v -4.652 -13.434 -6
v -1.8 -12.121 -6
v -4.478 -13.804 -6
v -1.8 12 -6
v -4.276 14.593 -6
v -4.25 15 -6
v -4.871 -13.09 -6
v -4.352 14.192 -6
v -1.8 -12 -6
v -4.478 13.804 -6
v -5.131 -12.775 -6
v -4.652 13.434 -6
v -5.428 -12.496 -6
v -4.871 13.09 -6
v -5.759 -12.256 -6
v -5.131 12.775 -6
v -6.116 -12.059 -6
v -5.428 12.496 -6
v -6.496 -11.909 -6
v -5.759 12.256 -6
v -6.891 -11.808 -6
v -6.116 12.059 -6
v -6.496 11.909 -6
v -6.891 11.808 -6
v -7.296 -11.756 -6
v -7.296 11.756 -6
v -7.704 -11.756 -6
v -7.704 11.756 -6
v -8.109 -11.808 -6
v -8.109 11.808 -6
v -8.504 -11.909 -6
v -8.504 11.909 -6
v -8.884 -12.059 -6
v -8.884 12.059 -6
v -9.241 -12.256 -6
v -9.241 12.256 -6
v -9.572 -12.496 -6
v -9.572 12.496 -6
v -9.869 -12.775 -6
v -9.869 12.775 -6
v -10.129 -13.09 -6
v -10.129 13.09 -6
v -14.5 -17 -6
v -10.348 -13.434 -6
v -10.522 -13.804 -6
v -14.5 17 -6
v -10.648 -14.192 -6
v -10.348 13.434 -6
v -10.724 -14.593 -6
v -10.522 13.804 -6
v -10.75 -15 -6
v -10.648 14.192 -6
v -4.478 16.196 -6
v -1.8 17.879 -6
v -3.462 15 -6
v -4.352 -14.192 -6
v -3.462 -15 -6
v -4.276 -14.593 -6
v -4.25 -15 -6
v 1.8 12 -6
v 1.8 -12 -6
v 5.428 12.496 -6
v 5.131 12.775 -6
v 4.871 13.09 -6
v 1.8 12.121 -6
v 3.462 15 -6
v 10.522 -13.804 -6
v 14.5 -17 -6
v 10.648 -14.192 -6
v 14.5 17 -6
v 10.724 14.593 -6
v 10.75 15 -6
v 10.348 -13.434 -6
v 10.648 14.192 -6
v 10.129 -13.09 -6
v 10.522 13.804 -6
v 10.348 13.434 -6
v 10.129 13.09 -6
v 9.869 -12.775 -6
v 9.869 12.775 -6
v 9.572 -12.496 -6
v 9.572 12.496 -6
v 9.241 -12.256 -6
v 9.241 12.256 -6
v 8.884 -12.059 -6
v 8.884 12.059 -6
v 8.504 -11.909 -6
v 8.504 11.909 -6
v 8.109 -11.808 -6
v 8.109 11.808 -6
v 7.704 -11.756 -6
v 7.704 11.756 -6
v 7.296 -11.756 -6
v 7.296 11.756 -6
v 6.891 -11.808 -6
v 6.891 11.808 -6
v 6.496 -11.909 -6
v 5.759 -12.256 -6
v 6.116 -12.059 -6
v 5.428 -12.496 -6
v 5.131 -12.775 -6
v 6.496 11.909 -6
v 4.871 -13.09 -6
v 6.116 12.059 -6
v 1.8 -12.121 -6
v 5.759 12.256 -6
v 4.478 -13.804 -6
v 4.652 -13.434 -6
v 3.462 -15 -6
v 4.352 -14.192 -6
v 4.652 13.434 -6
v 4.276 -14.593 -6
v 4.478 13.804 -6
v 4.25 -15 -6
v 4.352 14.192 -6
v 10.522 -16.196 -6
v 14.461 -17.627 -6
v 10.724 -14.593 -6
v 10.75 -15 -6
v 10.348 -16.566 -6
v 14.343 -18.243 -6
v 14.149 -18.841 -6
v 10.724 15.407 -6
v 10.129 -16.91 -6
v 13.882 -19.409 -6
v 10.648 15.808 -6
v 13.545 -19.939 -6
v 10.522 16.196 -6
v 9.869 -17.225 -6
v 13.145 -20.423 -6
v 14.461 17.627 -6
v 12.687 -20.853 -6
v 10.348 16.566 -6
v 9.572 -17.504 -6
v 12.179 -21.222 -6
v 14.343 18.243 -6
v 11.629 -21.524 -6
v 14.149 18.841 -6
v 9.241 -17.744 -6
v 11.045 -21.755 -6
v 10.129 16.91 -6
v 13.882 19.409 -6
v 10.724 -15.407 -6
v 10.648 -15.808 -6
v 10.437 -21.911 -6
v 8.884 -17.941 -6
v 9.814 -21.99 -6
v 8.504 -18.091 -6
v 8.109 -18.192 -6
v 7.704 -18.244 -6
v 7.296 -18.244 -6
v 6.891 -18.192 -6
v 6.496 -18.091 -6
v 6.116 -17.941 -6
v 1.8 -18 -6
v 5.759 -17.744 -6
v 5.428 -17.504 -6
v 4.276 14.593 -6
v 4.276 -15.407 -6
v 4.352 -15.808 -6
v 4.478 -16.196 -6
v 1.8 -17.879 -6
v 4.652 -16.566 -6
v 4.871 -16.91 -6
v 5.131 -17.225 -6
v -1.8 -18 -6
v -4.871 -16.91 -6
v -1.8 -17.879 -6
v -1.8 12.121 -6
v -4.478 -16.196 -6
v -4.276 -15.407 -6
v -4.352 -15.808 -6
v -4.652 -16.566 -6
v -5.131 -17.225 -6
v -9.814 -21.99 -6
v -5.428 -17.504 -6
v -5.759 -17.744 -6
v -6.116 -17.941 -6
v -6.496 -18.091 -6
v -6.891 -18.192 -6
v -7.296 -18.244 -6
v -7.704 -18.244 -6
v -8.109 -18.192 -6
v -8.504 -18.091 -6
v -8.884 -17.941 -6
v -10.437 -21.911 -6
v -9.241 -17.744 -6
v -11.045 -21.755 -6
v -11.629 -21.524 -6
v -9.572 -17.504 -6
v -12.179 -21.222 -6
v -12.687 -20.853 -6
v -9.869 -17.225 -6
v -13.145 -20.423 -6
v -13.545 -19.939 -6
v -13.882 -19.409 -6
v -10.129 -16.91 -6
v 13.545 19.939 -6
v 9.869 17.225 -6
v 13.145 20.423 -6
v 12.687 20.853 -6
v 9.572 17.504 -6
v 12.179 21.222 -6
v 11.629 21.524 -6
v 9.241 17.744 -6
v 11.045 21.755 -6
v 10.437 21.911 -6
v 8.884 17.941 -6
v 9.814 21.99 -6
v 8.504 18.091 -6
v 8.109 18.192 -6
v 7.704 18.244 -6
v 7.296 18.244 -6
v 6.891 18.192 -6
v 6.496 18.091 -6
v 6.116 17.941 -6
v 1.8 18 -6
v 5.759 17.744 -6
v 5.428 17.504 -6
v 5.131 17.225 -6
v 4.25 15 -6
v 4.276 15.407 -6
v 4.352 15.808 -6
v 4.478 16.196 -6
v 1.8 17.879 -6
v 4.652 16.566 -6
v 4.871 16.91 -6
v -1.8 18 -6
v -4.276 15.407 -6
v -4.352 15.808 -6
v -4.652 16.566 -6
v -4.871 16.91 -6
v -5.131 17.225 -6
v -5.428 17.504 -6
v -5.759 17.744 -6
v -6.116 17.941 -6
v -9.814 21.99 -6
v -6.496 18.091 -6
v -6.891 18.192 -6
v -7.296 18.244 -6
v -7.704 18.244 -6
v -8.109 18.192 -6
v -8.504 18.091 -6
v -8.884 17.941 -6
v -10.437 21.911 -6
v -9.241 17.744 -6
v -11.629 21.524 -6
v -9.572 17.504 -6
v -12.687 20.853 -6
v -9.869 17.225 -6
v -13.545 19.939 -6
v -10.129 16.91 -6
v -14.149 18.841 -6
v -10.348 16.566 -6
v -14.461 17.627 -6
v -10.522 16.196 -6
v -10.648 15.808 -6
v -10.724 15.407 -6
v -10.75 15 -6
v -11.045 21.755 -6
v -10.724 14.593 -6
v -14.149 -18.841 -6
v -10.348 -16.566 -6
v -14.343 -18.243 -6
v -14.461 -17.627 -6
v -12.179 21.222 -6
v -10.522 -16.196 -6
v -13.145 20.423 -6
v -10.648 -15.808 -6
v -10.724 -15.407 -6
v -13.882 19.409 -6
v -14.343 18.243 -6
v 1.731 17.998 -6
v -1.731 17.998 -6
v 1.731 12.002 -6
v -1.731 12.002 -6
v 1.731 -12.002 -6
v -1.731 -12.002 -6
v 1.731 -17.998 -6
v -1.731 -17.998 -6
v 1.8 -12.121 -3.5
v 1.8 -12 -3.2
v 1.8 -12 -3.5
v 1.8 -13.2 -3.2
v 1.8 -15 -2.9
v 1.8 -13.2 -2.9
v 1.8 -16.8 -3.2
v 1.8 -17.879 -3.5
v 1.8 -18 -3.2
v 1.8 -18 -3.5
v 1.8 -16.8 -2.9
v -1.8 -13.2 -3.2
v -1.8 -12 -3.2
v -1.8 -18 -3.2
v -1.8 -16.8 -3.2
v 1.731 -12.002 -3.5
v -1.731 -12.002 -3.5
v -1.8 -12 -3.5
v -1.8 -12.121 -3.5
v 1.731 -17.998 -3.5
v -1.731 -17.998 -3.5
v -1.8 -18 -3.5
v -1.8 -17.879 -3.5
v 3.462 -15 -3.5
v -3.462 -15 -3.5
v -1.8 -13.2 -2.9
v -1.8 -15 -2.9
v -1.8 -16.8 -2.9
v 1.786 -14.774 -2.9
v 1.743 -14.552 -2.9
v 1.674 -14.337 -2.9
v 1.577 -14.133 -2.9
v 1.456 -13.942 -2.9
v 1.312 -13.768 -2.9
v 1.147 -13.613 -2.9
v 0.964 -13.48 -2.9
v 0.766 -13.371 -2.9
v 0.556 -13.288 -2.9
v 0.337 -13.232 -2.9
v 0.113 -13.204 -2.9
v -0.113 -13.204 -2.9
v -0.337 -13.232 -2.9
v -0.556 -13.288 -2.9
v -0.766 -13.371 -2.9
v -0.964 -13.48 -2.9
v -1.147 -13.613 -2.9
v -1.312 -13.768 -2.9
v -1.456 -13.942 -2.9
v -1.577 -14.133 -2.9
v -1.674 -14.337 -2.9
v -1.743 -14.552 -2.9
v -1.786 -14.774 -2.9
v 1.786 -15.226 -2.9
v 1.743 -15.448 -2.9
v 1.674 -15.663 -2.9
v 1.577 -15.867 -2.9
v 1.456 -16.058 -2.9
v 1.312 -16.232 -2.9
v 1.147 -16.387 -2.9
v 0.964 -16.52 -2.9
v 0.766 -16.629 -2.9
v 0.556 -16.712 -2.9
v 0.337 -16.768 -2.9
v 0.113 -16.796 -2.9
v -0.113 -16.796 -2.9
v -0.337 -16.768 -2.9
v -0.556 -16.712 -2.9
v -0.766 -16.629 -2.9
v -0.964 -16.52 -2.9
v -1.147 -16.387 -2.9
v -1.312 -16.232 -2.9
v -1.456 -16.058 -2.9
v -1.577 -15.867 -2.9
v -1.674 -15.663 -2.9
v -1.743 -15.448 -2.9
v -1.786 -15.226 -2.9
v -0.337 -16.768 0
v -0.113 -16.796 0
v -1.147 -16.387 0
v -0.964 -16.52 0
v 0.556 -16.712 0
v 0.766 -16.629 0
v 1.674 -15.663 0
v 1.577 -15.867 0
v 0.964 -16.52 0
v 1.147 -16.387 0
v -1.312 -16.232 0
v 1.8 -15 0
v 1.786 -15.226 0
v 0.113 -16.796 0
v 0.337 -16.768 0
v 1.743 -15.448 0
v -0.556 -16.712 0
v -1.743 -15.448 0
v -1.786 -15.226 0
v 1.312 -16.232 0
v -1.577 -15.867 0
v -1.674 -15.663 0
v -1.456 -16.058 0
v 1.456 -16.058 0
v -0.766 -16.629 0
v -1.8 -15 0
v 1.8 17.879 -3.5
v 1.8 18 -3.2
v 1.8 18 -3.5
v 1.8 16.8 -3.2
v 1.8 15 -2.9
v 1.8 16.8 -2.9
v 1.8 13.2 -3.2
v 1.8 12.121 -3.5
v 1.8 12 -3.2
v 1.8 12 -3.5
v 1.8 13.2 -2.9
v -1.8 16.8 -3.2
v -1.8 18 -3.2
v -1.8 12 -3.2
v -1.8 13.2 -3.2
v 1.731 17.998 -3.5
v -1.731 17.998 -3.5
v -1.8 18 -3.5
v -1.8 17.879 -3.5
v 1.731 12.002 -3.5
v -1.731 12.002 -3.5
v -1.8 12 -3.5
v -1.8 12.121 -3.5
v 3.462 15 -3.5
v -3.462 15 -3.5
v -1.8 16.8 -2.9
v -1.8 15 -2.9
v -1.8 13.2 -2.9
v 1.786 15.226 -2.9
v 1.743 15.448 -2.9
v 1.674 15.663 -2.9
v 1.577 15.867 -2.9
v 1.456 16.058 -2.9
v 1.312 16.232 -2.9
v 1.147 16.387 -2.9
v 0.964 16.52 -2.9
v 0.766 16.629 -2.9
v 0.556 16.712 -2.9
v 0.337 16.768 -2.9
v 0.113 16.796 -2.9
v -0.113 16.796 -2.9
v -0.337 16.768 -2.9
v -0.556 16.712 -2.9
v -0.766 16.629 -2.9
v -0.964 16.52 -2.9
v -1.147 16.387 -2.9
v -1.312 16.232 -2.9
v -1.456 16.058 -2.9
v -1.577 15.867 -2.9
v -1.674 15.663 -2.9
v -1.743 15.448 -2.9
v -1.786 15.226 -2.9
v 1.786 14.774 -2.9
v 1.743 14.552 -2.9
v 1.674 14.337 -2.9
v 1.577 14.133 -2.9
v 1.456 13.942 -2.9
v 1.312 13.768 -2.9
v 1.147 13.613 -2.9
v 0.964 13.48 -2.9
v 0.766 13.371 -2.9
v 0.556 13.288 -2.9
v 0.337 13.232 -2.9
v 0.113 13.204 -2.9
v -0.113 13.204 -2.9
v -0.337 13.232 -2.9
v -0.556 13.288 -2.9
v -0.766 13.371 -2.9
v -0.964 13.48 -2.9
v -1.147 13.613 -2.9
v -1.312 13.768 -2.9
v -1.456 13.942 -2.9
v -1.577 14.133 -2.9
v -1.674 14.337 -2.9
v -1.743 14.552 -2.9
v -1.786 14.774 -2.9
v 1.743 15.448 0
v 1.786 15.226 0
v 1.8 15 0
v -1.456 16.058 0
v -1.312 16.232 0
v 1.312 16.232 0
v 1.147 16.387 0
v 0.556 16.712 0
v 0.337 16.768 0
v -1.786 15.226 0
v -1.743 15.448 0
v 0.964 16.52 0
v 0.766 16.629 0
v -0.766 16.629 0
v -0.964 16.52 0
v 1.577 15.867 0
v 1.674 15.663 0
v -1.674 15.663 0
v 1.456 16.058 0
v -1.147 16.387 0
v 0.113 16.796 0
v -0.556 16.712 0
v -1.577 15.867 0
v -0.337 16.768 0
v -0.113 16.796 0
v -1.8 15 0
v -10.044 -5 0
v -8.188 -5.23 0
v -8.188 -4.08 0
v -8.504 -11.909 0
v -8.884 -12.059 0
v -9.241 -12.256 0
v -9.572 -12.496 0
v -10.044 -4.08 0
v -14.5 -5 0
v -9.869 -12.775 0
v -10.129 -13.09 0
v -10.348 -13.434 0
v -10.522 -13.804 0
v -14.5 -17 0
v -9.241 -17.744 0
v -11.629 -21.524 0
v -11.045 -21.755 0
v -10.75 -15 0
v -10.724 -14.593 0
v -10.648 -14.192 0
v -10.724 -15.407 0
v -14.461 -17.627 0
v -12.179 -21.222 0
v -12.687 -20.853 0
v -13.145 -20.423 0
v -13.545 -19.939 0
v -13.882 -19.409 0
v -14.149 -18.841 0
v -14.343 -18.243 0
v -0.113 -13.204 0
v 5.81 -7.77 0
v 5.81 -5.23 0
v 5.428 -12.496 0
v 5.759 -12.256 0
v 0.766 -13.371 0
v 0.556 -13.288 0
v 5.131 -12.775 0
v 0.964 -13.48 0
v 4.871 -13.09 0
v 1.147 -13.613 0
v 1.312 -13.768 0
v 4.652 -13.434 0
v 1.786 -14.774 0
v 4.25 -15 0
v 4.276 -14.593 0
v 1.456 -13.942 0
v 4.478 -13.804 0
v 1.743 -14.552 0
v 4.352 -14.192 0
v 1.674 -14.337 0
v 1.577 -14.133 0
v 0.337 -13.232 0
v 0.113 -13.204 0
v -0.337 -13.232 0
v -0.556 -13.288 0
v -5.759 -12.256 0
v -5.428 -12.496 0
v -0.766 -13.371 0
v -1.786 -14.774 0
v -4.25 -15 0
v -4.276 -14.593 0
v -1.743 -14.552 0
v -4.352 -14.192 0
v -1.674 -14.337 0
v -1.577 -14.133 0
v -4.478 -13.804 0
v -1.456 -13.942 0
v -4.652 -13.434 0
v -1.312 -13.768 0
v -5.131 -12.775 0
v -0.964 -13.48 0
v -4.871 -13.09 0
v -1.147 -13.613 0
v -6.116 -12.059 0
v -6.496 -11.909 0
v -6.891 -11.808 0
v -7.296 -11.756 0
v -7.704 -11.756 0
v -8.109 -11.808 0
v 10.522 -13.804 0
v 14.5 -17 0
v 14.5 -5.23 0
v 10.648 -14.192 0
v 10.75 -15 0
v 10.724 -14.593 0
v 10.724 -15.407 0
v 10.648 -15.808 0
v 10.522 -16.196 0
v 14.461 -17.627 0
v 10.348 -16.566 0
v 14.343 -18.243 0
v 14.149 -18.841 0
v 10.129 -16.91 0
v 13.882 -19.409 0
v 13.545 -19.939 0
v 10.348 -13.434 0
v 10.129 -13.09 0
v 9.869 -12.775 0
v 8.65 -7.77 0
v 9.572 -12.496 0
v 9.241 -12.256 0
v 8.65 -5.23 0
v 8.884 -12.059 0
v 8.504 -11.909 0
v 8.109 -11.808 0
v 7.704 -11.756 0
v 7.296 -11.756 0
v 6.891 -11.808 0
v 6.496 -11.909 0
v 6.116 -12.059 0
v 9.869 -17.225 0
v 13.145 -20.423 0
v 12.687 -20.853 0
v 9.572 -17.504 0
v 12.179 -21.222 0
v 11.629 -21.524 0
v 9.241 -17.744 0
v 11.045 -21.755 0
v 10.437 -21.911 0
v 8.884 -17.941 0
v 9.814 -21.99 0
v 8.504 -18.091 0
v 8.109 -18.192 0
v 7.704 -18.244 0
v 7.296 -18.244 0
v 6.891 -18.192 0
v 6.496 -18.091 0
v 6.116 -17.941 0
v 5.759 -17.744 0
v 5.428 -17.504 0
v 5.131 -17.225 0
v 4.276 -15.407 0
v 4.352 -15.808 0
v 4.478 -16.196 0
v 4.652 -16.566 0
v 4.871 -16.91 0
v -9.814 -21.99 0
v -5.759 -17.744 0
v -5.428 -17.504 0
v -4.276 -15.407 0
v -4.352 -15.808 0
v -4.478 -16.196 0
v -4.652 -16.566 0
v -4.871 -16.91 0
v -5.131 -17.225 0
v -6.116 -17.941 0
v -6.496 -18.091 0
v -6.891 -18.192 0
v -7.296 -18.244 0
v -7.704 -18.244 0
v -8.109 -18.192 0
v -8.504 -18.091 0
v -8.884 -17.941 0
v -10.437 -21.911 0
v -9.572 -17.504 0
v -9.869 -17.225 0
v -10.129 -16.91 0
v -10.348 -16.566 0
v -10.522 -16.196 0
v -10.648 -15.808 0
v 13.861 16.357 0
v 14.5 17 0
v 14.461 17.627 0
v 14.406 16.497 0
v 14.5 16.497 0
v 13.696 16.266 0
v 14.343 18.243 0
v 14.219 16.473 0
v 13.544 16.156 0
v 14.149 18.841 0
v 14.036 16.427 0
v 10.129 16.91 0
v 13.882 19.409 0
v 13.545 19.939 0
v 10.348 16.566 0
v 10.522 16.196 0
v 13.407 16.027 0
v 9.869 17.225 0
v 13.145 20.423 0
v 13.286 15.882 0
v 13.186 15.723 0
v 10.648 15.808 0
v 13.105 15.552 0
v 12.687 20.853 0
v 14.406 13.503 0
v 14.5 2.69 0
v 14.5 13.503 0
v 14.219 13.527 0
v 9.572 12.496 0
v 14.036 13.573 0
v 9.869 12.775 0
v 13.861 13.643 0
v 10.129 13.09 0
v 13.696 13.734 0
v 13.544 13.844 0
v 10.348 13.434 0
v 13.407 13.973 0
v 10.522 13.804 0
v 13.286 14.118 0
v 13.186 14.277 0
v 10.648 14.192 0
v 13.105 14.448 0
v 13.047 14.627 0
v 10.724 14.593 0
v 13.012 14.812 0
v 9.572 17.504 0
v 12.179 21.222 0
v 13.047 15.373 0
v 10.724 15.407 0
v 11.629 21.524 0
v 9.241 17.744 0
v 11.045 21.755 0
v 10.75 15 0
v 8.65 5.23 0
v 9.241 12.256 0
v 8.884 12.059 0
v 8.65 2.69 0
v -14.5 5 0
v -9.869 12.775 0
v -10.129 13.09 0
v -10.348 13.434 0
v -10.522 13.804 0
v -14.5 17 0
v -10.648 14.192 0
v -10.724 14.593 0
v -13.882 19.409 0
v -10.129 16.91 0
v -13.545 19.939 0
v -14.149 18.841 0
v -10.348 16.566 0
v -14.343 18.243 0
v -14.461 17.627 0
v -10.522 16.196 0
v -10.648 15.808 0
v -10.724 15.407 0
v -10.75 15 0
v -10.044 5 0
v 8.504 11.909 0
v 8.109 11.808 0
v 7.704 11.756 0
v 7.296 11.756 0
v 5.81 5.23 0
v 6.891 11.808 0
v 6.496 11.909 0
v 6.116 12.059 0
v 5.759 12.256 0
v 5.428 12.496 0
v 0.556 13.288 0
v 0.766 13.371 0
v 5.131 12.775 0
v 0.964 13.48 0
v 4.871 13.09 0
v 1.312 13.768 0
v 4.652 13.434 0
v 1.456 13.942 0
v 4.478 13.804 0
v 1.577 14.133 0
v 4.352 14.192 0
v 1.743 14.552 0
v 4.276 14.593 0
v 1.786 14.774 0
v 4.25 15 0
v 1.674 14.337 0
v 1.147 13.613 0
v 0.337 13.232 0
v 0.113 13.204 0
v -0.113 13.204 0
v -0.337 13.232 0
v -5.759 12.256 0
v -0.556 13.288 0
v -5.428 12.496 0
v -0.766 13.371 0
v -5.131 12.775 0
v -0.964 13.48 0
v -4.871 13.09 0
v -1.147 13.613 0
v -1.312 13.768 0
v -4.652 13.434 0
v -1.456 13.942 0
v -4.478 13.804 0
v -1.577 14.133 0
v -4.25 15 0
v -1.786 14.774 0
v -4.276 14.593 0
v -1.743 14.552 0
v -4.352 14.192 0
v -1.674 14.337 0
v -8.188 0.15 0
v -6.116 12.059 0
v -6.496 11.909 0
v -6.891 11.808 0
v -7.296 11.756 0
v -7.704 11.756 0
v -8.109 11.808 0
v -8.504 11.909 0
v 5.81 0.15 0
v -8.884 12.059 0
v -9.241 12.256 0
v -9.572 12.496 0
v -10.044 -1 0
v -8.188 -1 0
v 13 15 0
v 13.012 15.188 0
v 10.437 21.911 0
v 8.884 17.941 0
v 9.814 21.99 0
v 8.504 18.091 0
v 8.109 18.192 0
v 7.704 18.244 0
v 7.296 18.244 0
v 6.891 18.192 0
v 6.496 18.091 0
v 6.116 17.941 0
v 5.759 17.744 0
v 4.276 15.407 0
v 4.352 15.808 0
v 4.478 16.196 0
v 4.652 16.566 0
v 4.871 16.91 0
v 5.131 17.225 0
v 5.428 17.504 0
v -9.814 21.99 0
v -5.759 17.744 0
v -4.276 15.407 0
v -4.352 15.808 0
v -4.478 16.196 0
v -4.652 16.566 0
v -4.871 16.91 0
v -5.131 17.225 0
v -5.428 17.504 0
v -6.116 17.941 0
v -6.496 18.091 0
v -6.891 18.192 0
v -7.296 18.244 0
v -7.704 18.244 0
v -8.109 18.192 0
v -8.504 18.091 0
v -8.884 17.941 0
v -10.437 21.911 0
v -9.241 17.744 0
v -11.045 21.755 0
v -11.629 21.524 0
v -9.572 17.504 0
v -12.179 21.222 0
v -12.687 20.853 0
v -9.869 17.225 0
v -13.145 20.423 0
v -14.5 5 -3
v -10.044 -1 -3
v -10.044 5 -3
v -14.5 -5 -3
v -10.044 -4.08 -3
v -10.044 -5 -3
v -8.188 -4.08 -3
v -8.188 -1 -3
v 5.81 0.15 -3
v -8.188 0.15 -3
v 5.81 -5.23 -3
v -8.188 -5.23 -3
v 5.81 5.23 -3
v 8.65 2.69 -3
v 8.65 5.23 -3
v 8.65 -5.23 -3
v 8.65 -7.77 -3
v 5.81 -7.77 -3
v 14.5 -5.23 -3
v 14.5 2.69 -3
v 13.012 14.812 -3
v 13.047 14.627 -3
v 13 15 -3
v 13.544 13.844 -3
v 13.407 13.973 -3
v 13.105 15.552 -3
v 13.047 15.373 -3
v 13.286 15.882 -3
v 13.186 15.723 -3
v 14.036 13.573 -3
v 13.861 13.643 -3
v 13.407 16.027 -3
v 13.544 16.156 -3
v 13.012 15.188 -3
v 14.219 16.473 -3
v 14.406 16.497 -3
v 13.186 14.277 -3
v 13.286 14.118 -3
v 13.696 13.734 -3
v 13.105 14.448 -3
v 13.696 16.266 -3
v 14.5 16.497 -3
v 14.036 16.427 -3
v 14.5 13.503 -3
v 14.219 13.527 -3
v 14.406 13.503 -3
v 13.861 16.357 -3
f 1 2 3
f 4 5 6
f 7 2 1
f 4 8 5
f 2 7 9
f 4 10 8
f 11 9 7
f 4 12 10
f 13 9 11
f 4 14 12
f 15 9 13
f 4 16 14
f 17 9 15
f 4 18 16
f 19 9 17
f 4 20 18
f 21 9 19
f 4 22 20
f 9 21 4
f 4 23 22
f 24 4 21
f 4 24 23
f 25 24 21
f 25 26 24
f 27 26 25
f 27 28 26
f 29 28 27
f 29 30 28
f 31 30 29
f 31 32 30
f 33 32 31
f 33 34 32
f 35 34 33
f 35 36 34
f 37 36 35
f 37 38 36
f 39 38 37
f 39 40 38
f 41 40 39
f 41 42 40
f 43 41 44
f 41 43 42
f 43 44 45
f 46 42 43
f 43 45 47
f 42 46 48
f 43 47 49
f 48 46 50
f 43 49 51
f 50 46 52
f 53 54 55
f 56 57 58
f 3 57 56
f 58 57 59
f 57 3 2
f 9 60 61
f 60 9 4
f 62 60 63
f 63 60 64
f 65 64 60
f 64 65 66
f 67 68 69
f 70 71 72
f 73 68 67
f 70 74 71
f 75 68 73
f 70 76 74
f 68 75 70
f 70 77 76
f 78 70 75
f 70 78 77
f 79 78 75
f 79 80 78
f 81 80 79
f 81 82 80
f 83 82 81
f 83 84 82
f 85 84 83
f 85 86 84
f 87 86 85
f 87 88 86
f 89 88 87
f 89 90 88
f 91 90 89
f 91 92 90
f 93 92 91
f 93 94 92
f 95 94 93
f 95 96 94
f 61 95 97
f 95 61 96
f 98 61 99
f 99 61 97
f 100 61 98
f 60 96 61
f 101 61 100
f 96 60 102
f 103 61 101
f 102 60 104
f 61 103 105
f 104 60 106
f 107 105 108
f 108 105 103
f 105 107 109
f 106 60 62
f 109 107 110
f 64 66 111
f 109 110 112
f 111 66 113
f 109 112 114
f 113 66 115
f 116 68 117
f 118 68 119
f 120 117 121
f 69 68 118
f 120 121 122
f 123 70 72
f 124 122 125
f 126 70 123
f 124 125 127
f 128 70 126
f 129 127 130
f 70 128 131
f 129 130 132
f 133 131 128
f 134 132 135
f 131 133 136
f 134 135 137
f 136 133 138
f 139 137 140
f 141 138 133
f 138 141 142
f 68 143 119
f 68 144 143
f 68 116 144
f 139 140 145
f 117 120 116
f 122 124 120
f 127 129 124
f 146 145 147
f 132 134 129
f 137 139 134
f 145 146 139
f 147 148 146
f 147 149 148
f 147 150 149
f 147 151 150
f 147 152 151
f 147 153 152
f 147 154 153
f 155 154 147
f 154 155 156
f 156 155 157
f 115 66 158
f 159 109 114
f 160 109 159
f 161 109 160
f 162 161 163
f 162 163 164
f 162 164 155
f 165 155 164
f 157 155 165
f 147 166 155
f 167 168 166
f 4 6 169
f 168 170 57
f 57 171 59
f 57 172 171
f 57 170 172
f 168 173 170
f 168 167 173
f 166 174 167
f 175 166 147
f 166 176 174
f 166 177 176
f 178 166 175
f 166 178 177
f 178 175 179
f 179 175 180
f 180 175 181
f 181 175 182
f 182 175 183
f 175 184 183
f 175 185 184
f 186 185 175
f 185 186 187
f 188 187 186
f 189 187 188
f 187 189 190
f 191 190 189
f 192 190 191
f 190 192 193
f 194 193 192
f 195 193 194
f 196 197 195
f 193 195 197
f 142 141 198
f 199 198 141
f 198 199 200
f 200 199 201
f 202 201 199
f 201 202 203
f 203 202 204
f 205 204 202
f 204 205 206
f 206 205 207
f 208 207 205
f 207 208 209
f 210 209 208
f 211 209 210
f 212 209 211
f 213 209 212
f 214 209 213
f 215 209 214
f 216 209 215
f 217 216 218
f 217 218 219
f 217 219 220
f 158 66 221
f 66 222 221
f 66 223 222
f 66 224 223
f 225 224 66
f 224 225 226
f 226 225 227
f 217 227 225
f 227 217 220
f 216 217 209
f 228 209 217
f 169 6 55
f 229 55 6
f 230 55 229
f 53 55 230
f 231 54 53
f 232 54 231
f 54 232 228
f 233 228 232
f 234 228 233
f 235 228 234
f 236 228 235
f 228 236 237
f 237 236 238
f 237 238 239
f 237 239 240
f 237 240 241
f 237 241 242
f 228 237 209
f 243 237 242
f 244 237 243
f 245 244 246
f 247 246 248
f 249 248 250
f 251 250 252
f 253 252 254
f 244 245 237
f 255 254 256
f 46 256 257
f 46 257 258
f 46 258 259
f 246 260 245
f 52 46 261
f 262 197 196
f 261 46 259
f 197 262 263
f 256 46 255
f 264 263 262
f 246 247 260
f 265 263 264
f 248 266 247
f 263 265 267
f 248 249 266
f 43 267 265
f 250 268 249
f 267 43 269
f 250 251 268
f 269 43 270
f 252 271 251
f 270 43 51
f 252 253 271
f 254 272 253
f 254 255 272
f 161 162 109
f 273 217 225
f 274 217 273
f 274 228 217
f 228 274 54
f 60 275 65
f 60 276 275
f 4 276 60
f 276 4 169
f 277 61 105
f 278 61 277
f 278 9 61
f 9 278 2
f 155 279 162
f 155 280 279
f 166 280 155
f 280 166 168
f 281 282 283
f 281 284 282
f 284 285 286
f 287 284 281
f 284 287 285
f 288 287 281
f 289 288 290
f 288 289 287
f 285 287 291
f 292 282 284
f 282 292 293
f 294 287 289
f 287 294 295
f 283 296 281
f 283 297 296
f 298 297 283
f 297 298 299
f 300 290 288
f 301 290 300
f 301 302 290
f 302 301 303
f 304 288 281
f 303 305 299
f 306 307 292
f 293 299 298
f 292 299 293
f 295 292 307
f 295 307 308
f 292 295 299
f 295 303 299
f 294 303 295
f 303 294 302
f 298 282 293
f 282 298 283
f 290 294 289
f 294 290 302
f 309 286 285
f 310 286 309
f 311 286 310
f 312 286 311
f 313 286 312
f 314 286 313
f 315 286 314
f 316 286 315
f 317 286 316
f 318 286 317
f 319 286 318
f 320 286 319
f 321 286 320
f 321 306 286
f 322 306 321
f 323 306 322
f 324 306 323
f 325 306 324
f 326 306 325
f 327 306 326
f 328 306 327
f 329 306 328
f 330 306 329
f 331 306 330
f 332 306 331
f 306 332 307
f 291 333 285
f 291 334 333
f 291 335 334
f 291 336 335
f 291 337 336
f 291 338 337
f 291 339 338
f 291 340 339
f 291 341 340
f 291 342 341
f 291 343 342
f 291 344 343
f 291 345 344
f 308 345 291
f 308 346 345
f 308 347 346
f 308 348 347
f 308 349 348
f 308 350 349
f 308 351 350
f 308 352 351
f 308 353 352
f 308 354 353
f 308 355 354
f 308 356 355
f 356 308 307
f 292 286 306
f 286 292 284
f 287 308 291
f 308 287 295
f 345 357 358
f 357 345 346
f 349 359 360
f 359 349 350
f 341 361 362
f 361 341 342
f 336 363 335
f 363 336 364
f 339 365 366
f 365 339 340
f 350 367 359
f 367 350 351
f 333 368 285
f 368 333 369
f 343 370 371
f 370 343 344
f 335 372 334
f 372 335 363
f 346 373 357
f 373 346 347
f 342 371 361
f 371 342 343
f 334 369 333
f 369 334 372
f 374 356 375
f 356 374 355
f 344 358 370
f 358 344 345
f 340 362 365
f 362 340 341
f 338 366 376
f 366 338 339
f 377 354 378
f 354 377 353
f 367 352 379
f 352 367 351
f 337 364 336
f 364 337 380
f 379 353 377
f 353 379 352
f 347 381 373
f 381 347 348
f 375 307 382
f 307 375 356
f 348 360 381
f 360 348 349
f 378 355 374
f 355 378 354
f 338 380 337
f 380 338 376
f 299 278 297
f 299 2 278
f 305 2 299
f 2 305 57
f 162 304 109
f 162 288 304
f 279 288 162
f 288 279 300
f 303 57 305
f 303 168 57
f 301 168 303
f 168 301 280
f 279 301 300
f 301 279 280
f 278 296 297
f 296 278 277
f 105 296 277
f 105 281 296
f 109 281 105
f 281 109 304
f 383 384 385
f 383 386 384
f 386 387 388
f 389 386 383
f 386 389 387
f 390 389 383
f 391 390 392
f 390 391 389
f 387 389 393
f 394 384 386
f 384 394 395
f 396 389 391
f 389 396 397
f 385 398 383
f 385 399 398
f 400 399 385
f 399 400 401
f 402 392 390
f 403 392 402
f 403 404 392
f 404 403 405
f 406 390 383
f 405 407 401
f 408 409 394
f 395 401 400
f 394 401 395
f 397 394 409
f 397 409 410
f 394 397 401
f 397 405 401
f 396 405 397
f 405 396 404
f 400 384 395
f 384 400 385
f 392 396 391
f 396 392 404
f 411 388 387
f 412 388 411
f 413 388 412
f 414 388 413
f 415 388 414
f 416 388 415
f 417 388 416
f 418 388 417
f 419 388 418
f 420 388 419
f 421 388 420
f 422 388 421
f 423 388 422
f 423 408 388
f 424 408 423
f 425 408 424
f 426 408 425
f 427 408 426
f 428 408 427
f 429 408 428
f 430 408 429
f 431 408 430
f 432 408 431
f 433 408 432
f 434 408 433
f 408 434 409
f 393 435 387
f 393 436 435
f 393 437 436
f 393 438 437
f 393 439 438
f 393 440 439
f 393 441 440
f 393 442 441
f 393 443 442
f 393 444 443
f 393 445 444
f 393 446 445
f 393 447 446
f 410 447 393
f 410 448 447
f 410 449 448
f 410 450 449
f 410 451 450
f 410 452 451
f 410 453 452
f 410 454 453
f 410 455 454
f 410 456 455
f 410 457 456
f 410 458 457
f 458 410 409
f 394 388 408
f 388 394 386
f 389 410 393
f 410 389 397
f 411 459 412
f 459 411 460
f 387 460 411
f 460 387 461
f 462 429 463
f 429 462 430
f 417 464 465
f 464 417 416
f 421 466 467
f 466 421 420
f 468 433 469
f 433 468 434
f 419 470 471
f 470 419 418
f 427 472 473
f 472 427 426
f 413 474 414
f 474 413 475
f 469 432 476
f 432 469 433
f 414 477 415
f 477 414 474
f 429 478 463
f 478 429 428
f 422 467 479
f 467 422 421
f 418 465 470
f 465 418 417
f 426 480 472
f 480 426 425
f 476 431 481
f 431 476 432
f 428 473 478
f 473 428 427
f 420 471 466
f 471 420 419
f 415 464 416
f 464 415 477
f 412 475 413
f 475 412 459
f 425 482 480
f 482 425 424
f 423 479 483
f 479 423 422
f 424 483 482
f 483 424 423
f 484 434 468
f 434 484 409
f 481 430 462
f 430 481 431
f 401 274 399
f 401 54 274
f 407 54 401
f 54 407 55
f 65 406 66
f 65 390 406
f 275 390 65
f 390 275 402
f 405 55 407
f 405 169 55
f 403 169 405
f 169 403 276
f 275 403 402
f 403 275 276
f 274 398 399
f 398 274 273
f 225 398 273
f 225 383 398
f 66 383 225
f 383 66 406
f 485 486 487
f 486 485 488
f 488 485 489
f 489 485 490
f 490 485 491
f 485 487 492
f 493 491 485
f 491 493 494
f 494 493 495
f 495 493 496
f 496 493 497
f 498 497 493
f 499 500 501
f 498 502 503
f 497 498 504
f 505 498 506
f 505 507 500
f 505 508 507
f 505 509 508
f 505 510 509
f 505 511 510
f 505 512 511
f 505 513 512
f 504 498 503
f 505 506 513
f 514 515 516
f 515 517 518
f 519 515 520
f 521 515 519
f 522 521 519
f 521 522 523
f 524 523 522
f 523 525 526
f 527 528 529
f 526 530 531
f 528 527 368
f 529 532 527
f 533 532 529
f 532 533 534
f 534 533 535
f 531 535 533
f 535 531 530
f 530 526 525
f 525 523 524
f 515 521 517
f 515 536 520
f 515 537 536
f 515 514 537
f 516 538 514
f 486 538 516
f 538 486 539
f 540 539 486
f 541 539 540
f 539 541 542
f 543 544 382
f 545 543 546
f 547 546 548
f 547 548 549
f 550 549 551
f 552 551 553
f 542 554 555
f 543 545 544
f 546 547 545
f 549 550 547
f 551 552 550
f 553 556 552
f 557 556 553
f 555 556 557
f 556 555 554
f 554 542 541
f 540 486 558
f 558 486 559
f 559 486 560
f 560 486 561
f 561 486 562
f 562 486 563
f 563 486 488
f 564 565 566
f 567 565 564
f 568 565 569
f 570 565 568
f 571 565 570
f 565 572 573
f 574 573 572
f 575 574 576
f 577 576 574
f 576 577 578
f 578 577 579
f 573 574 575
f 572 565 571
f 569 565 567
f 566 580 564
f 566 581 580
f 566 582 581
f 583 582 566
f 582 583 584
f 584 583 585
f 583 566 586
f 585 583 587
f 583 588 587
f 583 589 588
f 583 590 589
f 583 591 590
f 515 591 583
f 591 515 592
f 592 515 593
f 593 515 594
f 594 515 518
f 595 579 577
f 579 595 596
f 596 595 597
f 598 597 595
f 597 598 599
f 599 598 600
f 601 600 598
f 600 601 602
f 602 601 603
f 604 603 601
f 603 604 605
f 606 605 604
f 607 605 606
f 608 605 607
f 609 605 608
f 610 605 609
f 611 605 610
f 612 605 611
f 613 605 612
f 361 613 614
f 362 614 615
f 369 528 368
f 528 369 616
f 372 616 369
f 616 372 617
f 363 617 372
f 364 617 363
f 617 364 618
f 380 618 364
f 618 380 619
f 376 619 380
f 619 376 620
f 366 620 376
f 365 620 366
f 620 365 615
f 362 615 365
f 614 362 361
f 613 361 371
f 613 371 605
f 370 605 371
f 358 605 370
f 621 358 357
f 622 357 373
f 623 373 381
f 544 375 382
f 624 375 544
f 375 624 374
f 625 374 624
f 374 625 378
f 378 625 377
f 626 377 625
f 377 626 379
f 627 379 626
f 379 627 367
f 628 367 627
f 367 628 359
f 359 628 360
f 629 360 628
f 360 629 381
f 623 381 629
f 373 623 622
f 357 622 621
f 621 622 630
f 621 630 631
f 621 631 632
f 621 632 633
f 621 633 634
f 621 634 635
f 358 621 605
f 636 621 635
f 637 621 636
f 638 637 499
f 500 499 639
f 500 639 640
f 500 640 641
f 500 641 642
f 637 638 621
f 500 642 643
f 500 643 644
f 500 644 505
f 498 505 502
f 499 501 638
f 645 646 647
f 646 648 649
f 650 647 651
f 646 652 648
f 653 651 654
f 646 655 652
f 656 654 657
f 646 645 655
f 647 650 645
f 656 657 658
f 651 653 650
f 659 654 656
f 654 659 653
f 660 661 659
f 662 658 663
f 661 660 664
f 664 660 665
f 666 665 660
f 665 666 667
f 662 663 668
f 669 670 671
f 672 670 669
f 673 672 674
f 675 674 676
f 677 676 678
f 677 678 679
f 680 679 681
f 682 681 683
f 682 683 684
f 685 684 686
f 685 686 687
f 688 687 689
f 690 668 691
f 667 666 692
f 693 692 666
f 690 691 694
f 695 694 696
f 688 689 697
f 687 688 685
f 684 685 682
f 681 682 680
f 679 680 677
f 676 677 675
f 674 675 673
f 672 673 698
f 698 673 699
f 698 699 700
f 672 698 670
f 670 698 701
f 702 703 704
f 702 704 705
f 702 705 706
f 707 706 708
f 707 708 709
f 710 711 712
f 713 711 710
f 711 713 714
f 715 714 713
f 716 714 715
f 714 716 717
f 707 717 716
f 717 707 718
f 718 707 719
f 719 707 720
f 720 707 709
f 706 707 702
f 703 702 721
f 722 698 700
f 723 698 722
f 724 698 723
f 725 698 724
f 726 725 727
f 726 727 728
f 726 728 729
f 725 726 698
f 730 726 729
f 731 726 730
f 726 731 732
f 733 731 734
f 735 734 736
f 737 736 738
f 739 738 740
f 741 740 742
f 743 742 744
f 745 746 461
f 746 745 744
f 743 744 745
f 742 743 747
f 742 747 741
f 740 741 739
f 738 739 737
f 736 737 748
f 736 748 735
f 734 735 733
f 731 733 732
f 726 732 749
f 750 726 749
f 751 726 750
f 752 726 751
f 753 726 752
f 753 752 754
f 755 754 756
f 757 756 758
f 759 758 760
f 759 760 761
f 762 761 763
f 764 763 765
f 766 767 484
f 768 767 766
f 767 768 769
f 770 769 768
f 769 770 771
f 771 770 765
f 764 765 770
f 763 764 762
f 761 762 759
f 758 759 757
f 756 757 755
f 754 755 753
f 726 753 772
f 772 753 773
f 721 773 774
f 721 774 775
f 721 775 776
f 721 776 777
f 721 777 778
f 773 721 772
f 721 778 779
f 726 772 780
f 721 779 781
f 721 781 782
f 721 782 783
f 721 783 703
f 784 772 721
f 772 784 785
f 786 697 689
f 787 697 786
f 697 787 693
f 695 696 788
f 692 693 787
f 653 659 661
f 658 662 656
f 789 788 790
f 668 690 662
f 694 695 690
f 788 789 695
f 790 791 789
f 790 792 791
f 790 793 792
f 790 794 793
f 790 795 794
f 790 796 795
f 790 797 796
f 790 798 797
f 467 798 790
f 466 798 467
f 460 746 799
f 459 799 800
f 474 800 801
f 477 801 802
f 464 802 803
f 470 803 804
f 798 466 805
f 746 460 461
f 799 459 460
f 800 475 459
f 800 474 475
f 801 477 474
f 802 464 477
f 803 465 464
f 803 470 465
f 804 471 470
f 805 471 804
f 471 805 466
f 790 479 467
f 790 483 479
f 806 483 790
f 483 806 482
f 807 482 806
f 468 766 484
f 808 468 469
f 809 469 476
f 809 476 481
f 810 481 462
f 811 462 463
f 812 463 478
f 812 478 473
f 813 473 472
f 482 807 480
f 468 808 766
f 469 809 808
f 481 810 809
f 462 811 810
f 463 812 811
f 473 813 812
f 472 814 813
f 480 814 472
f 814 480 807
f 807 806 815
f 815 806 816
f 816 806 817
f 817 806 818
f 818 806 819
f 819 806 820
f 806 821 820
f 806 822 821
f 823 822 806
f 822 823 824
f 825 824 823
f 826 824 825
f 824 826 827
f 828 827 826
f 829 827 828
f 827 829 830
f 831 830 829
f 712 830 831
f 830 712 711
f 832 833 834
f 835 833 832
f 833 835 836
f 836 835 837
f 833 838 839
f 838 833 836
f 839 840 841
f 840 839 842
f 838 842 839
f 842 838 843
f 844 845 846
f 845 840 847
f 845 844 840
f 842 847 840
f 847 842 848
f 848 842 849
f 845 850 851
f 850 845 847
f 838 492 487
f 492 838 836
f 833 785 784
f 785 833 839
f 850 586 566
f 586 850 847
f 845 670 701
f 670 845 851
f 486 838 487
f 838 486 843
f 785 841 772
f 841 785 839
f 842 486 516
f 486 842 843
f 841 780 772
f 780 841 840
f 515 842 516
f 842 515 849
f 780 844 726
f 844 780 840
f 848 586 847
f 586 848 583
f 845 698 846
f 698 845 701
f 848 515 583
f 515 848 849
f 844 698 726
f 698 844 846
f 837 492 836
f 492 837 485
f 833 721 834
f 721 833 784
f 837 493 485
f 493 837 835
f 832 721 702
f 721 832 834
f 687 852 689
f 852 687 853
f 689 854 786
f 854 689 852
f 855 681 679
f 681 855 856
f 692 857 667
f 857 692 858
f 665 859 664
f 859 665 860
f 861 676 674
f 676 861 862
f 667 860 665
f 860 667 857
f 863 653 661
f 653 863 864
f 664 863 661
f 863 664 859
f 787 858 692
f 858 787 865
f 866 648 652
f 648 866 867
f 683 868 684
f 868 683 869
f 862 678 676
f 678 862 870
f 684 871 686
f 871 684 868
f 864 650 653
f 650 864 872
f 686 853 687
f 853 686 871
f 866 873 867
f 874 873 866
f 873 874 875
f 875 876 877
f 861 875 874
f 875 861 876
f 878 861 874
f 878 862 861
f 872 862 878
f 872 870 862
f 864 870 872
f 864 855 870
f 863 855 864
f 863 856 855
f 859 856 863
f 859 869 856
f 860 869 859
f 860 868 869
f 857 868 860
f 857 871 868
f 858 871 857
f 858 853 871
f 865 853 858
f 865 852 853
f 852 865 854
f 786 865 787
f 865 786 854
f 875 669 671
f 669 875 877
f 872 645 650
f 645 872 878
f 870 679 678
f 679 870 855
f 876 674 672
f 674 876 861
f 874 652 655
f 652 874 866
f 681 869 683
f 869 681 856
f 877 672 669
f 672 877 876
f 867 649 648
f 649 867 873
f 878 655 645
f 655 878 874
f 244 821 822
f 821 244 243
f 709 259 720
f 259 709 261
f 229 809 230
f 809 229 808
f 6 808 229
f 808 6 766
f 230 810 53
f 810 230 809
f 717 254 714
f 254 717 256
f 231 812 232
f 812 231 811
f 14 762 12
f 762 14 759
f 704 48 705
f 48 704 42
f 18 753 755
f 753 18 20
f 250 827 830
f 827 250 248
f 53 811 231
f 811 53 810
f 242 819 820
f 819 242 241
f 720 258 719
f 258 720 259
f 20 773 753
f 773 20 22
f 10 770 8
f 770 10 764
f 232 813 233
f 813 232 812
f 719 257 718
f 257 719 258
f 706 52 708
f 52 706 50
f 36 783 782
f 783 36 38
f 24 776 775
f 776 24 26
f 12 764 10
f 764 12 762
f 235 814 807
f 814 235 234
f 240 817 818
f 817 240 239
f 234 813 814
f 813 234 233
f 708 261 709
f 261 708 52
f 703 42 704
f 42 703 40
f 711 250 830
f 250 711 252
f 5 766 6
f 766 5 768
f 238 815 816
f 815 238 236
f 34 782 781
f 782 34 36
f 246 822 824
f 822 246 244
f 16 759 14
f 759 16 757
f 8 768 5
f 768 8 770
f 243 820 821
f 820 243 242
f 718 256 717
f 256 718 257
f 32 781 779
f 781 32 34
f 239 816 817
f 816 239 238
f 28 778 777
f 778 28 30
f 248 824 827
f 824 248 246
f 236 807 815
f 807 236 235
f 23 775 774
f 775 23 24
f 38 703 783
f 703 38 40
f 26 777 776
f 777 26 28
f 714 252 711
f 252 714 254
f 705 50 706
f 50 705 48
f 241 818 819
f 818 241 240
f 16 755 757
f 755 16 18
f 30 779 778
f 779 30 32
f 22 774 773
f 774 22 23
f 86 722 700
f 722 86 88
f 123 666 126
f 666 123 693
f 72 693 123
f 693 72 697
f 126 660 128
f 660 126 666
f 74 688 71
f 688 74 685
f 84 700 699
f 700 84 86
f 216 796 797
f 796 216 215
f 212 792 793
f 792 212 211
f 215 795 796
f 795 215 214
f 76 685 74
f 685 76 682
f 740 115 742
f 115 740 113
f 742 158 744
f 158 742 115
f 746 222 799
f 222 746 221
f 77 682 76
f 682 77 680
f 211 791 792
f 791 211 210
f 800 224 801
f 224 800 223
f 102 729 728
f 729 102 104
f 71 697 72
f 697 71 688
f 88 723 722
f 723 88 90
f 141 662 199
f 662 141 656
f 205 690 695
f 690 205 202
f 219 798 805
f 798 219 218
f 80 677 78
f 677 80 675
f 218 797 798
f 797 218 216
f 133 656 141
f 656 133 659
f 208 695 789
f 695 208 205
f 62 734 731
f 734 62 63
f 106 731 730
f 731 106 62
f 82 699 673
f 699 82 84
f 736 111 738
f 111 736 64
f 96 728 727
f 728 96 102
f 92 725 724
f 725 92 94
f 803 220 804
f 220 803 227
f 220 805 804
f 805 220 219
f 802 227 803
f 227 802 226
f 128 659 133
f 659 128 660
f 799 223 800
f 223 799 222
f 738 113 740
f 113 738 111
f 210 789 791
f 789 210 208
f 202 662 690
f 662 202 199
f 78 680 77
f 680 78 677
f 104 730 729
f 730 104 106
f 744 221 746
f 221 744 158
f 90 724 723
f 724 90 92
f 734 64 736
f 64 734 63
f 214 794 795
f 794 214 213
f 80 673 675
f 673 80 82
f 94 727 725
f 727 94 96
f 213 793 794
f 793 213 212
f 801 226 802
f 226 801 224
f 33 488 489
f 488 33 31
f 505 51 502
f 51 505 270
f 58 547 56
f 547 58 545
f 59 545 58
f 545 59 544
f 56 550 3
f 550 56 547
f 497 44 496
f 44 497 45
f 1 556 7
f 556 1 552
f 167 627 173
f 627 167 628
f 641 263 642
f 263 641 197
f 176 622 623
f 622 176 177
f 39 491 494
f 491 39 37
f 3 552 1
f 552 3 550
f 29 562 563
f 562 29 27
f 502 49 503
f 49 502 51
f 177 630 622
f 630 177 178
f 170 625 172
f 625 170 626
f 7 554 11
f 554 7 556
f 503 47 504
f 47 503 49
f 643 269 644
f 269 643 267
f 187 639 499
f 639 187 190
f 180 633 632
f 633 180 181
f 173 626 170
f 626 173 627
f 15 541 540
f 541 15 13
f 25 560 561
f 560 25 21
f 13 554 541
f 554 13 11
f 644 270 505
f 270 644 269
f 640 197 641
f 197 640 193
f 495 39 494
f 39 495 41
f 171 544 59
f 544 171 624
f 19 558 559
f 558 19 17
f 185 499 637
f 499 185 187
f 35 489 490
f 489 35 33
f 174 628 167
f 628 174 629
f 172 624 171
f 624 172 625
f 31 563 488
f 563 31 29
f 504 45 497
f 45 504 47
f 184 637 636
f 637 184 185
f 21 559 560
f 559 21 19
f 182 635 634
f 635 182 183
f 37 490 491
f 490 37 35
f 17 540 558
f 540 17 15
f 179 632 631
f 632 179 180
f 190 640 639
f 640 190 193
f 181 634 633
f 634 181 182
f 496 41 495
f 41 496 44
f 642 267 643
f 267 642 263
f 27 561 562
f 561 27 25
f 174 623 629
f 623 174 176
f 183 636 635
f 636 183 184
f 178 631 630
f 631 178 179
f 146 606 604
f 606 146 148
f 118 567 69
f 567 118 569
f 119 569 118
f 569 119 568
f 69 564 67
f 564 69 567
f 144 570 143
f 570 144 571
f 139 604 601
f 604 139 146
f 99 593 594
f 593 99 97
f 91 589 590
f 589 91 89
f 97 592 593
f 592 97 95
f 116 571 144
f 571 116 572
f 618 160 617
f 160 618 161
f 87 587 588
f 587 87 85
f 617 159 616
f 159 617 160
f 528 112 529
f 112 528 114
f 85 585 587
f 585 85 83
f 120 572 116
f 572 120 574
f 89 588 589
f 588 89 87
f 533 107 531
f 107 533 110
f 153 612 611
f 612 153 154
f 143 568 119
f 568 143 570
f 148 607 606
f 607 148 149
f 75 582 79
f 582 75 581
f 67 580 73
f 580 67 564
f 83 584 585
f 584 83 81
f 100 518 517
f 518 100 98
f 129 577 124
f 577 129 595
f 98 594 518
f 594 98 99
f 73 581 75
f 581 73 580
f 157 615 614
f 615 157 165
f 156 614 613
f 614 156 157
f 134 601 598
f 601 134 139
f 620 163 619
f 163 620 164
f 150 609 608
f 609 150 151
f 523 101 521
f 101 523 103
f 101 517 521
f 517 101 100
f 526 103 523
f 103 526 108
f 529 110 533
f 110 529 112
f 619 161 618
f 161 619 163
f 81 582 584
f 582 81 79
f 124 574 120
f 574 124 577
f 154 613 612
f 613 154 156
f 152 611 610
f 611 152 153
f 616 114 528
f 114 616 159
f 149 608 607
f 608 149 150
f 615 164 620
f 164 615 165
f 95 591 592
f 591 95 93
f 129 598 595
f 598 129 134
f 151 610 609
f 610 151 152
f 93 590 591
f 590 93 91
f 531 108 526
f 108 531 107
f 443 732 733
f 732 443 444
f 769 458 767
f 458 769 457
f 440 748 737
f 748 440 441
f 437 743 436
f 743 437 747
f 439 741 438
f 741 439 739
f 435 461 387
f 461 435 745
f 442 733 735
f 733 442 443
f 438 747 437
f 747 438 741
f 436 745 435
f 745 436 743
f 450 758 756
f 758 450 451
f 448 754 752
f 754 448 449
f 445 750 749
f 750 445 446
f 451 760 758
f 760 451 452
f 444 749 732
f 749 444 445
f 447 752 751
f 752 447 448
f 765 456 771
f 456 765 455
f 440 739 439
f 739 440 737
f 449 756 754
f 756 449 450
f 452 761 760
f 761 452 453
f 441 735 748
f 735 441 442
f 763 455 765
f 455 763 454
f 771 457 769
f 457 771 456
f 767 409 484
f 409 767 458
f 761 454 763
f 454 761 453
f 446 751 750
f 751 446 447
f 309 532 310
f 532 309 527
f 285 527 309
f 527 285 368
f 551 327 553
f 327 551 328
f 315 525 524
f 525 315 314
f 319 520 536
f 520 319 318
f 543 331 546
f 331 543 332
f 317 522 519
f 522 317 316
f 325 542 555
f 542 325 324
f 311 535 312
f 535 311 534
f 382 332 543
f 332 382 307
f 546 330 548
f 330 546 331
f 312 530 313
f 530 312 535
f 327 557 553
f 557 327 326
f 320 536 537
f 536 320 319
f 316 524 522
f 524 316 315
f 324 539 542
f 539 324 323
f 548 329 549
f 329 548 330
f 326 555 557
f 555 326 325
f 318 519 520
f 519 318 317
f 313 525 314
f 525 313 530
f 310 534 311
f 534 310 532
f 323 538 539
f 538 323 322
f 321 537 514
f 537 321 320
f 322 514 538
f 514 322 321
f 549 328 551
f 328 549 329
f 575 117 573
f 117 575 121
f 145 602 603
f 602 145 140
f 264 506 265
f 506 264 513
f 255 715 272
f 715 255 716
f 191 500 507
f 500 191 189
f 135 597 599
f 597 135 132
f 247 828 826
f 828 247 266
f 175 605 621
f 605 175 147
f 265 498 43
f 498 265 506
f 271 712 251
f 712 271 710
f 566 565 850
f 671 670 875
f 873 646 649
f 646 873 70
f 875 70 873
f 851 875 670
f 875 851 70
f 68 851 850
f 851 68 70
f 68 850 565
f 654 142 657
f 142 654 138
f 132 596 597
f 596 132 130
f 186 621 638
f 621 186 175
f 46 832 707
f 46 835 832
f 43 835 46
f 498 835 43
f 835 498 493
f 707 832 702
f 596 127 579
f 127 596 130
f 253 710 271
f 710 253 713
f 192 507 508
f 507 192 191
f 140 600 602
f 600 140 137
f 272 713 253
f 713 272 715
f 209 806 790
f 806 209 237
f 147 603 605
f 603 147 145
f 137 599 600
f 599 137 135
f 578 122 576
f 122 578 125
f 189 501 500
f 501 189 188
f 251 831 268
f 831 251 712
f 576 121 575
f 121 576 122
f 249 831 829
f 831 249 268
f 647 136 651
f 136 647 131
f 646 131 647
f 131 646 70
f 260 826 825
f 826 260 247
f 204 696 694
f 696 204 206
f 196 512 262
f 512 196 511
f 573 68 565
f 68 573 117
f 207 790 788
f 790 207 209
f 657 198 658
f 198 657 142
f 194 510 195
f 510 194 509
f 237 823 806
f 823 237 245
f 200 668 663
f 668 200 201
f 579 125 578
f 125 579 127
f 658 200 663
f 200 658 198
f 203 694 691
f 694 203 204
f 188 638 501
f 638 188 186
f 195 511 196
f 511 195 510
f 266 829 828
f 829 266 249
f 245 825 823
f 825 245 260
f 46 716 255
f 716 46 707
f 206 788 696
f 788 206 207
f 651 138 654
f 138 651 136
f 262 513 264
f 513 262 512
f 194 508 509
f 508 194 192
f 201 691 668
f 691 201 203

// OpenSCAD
$fn = 50;


difference() {
	union() {
		*color(alpha = 1.0000000000, c = "gray") {
			translate(v = [0, 14, -6]) {
				linear_extrude(height = 3) {
					text(font = "Arial:style=Bold", halign = "center", size = 4.5000000000, text = "COMMENT description oobb_plate_shape_positive_type_6_depth_0_0_-6_pos_higher_voltage_extra_6_thickness_2_width_3_height_0_0_-6_pos_plate", valign = "center");
				}
			}
		}
		translate(v = [0, 0, -6]) {
			hull() {
				translate(v = [-9.5000000000, 17.0000000000, 0]) {
					cylinder(h = 6, r = 5);
				}
				translate(v = [9.5000000000, 17.0000000000, 0]) {
					cylinder(h = 6, r = 5);
				}
				translate(v = [-9.5000000000, -17.0000000000, 0]) {
					cylinder(h = 6, r = 5);
				}
				translate(v = [9.5000000000, -17.0000000000, 0]) {
					cylinder(h = 6, r = 5);
				}
			}
		}
		*color(alpha = 1.0000000000, c = "gray") {
			translate(v = [0, 14, -6]) {
				linear_extrude(height = 3) {
					text(font = "Arial:style=Bold", halign = "center", size = 4.5000000000, text = "COMMENT description oobb_holes_shape_p_type_0_0_-6_pos_higher_voltage_extra_6_thickness_2_width_3_height_0_0_-6_pos_plate_'left'_'right'_hole_sides_'left'_'right'_holes_true_both_holes", valign = "center");
				}
			}
		}
		*color(alpha = 1.0000000000, c = "gray") {
			translate(v = [-7.5000000000, 14, -3]) {
				rotate(a = [0, 0, 180]) {
					linear_extrude(height = 3) {
						text(font = "Arial:style=Bold", halign = "center", size = 4.5000000000, text = "COMMENT description oobb_wire_higher_voltage_shape_-7.5_0_-3_pos_higher_voltage_extra_6_thickness_2_width_3_height_0_0_-6_pos_plate_0_0_180_rot", valign = "center");
					}
				}
			}
		}
	}
	union() {
		translate(v = [0, -15, -6]) {
			rotate(a = [0, 0, 0]) {
				difference() {
					union() {
						translate(v = [-1.8000000000, -3.0000000000, -0.3000000000]) {
							cube(size = [3.6000000000, 6.0000000000, 0.3000000000]);
						}
						translate(v = [-1.8000000000, -1.8000000000, -0.6000000000]) {
							cube(size = [3.6000000000, 3.6000000000, 0.3000000000]);
						}
						translate(v = [-1.8000000000, -3.0000000000, 2.5000000000]) {
							cube(size = [3.6000000000, 6.0000000000, 0.3000000000]);
						}
						translate(v = [-1.8000000000, -1.8000000000, 2.8000000000]) {
							cube(size = [3.6000000000, 3.6000000000, 0.3000000000]);
						}
						translate(v = [0, 0, -50.0000000000]) {
							cylinder(h = 100, r = 1.8000000000);
						}
						linear_extrude(height = 2.5000000000) {
							polygon(points = [[3.4620000000, 0.0000000000], [1.7310000000, 2.9981799479], [-1.7310000000, 2.9981799479], [-3.4620000000, 0.0000000000], [-1.7310000000, -2.9981799479], [1.7310000000, -2.9981799479]]);
						}
						translate(v = [-1.8000000000, -3.0000000000, -0.3000000000]) {
							cube(size = [3.6000000000, 6.0000000000, 0.3000000000]);
						}
						translate(v = [-1.8000000000, -1.8000000000, -0.6000000000]) {
							cube(size = [3.6000000000, 3.6000000000, 0.3000000000]);
						}
						translate(v = [-1.8000000000, -3.0000000000, 2.5000000000]) {
							cube(size = [3.6000000000, 6.0000000000, 0.3000000000]);
						}
						translate(v = [-1.8000000000, -1.8000000000, 2.8000000000]) {
							cube(size = [3.6000000000, 3.6000000000, 0.3000000000]);
						}
						translate(v = [0, 0, -50.0000000000]) {
							cylinder(h = 100, r = 1.8000000000);
						}
						translate(v = [-1.8000000000, -3.0000000000, -0.3000000000]) {
							cube(size = [3.6000000000, 6.0000000000, 0.3000000000]);
						}
						translate(v = [-1.8000000000, -1.8000000000, -0.6000000000]) {
							cube(size = [3.6000000000, 3.6000000000, 0.3000000000]);
						}
						translate(v = [-1.8000000000, -3.0000000000, 2.5000000000]) {
							cube(size = [3.6000000000, 6.0000000000, 0.3000000000]);
						}
						translate(v = [-1.8000000000, -1.8000000000, 2.8000000000]) {
							cube(size = [3.6000000000, 3.6000000000, 0.3000000000]);
						}
						translate(v = [0, 0, -50.0000000000]) {
							cylinder(h = 100, r = 1.8000000000);
						}
					}
					union();
				}
			}
		}
		translate(v = [0, 15, -6]) {
			rotate(a = [0, 0, 0]) {
				difference() {
					union() {
						translate(v = [-1.8000000000, -3.0000000000, -0.3000000000]) {
							cube(size = [3.6000000000, 6.0000000000, 0.3000000000]);
						}
						translate(v = [-1.8000000000, -1.8000000000, -0.6000000000]) {
							cube(size = [3.6000000000, 3.6000000000, 0.3000000000]);
						}
						translate(v = [-1.8000000000, -3.0000000000, 2.5000000000]) {
							cube(size = [3.6000000000, 6.0000000000, 0.3000000000]);
						}
						translate(v = [-1.8000000000, -1.8000000000, 2.8000000000]) {
							cube(size = [3.6000000000, 3.6000000000, 0.3000000000]);
						}
						translate(v = [0, 0, -50.0000000000]) {
							cylinder(h = 100, r = 1.8000000000);
						}
						linear_extrude(height = 2.5000000000) {
							polygon(points = [[3.4620000000, 0.0000000000], [1.7310000000, 2.9981799479], [-1.7310000000, 2.9981799479], [-3.4620000000, 0.0000000000], [-1.7310000000, -2.9981799479], [1.7310000000, -2.9981799479]]);
						}
						translate(v = [-1.8000000000, -3.0000000000, -0.3000000000]) {
							cube(size = [3.6000000000, 6.0000000000, 0.3000000000]);
						}
						translate(v = [-1.8000000000, -1.8000000000, -0.6000000000]) {
							cube(size = [3.6000000000, 3.6000000000, 0.3000000000]);
						}
						translate(v = [-1.8000000000, -3.0000000000, 2.5000000000]) {
							cube(size = [3.6000000000, 6.0000000000, 0.3000000000]);
						}
						translate(v = [-1.8000000000, -1.8000000000, 2.8000000000]) {
							cube(size = [3.6000000000, 3.6000000000, 0.3000000000]);
						}
						translate(v = [0, 0, -50.0000000000]) {
							cylinder(h = 100, r = 1.8000000000);
						}
						translate(v = [-1.8000000000, -3.0000000000, -0.3000000000]) {
							cube(size = [3.6000000000, 6.0000000000, 0.3000000000]);
						}
						translate(v = [-1.8000000000, -1.8000000000, -0.6000000000]) {
							cube(size = [3.6000000000, 3.6000000000, 0.3000000000]);
						}
						translate(v = [-1.8000000000, -3.0000000000, 2.5000000000]) {
							cube(size = [3.6000000000, 6.0000000000, 0.3000000000]);
						}
						translate(v = [-1.8000000000, -1.8000000000, 2.8000000000]) {
							cube(size = [3.6000000000, 3.6000000000, 0.3000000000]);
						}
						translate(v = [0, 0, -50.0000000000]) {
							cylinder(h = 100, r = 1.8000000000);
						}
					}
					union();
				}
			}
		}
		translate(v = [15.0000000000, 0, -3]) {
			rotate(a = [0, 0, 180]) {
				difference() {
					union() {
						#translate(v = [23.0670000000, 1.0000000000, 0]) {
							cube(size = [5, 3.0800000000, 3]);
						}
						#translate(v = [0.2040000000, -2.6900000000, 0]) {
							cube(size = [6.3000000000, 7.9200000000, 3]);
						}
						#translate(v = [8.8880000000, -0.1500000000, 0]) {
							cube(size = [14.3000000000, 5.3800000000, 3]);
						}
						#translate(v = [6.3500000000, -5.2300000000, 0]) {
							cube(size = [2.8400000000, 13.0000000000, 3]);
						}
						#translate(v = [25.0440000000, -5.0000000000, 0]) {
							cube(size = [7, 10, 3]);
						}
						#translate(v = [0.5000000000, -15, 0.0000000000]) {
							cylinder(h = 3, r = 1.5000000000);
						}
					}
					union();
				}
			}
		}
		translate(v = [-7.5000000000, 15.0000000000, -50.0000000000]) {
			cylinder(h = 100, r = 3.2500000000);
		}
		translate(v = [7.5000000000, 15.0000000000, -50.0000000000]) {
			cylinder(h = 100, r = 3.2500000000);
		}
		translate(v = [-7.5000000000, -15.0000000000, -50.0000000000]) {
			cylinder(h = 100, r = 3.2500000000);
		}
		translate(v = [7.5000000000, -15.0000000000, -50.0000000000]) {
			cylinder(h = 100, r = 3.2500000000);
		}
		translate(v = [-7.5000000000, 15.0000000000, -50.0000000000]) {
			cylinder(h = 100, r = 1.8000000000);
		}
		translate(v = [0.0000000000, 15.0000000000, -50.0000000000]) {
			cylinder(h = 100, r = 1.8000000000);
		}
		translate(v = [7.5000000000, 15.0000000000, -50.0000000000]) {
			cylinder(h = 100, r = 1.8000000000);
		}
		translate(v = [-7.5000000000, -15.0000000000, -50.0000000000]) {
			cylinder(h = 100, r = 1.8000000000);
		}
		translate(v = [0.0000000000, -15.0000000000, -50.0000000000]) {
			cylinder(h = 100, r = 1.8000000000);
		}
		translate(v = [7.5000000000, -15.0000000000, -50.0000000000]) {
			cylinder(h = 100, r = 1.8000000000);
		}
		translate(v = [-7.5000000000, 15.0000000000, -50.0000000000]) {
			cylinder(h = 100, r = 1.8000000000);
		}
		translate(v = [0.0000000000, 15.0000000000, -50.0000000000]) {
			cylinder(h = 100, r = 1.8000000000);
		}
		translate(v = [7.5000000000, 15.0000000000, -50.0000000000]) {
			cylinder(h = 100, r = 1.8000000000);
		}
		translate(v = [-7.5000000000, -15.0000000000, -50.0000000000]) {
			cylinder(h = 100, r = 1.8000000000);
		}
		translate(v = [0.0000000000, -15.0000000000, -50.0000000000]) {
			cylinder(h = 100, r = 1.8000000000);
		}
		translate(v = [7.5000000000, -15.0000000000, -50.0000000000]) {
			cylinder(h = 100, r = 1.8000000000);
		}
		translate(v = [-7.5000000000, 15.0000000000, -50.0000000000]) {
			cylinder(h = 100, r = 1.8000000000);
		}
		translate(v = [0.0000000000, 15.0000000000, -50.0000000000]) {
			cylinder(h = 100, r = 1.8000000000);
		}
		translate(v = [7.5000000000, 15.0000000000, -50.0000000000]) {
			cylinder(h = 100, r = 1.8000000000);
		}
		translate(v = [-7.5000000000, -15.0000000000, -50.0000000000]) {
			cylinder(h = 100, r = 1.8000000000);
		}
		translate(v = [0.0000000000, -15.0000000000, -50.0000000000]) {
			cylinder(h = 100, r = 1.8000000000);
		}
		translate(v = [7.5000000000, -15.0000000000, -50.0000000000]) {
			cylinder(h = 100, r = 1.8000000000);
		}
		*color(alpha = 1.0000000000, c = "gray") {
			translate(v = [0, -1, -6]) {
				linear_extrude(height = 3) {
					text(font = "Arial:style=Bold", halign = "center", size = 4.5000000000, text = "COMMENT description oobb_nut_shape_negative_type_m3_radius_name_0_-15_-6_pos_6_thickness_2_width_3_height_0_0_-6_pos_plate_bottom_zz_true_overhang_0_0_0_rot_false_nut_true_hole", valign = "center");
				}
			}
		}
		*color(alpha = 1.0000000000, c = "gray") {
			translate(v = [0, 29, -6]) {
				linear_extrude(height = 3) {
					text(font = "Arial:style=Bold", halign = "center", size = 4.5000000000, text = "COMMENT description oobb_nut_shape_negative_type_m3_radius_name_0_15_-6_pos_6_thickness_2_width_3_height_0_0_-6_pos_plate_bottom_zz_true_overhang_0_0_0_rot_false_nut_true_hole", valign = "center");
				}
			}
		}
	}
}
